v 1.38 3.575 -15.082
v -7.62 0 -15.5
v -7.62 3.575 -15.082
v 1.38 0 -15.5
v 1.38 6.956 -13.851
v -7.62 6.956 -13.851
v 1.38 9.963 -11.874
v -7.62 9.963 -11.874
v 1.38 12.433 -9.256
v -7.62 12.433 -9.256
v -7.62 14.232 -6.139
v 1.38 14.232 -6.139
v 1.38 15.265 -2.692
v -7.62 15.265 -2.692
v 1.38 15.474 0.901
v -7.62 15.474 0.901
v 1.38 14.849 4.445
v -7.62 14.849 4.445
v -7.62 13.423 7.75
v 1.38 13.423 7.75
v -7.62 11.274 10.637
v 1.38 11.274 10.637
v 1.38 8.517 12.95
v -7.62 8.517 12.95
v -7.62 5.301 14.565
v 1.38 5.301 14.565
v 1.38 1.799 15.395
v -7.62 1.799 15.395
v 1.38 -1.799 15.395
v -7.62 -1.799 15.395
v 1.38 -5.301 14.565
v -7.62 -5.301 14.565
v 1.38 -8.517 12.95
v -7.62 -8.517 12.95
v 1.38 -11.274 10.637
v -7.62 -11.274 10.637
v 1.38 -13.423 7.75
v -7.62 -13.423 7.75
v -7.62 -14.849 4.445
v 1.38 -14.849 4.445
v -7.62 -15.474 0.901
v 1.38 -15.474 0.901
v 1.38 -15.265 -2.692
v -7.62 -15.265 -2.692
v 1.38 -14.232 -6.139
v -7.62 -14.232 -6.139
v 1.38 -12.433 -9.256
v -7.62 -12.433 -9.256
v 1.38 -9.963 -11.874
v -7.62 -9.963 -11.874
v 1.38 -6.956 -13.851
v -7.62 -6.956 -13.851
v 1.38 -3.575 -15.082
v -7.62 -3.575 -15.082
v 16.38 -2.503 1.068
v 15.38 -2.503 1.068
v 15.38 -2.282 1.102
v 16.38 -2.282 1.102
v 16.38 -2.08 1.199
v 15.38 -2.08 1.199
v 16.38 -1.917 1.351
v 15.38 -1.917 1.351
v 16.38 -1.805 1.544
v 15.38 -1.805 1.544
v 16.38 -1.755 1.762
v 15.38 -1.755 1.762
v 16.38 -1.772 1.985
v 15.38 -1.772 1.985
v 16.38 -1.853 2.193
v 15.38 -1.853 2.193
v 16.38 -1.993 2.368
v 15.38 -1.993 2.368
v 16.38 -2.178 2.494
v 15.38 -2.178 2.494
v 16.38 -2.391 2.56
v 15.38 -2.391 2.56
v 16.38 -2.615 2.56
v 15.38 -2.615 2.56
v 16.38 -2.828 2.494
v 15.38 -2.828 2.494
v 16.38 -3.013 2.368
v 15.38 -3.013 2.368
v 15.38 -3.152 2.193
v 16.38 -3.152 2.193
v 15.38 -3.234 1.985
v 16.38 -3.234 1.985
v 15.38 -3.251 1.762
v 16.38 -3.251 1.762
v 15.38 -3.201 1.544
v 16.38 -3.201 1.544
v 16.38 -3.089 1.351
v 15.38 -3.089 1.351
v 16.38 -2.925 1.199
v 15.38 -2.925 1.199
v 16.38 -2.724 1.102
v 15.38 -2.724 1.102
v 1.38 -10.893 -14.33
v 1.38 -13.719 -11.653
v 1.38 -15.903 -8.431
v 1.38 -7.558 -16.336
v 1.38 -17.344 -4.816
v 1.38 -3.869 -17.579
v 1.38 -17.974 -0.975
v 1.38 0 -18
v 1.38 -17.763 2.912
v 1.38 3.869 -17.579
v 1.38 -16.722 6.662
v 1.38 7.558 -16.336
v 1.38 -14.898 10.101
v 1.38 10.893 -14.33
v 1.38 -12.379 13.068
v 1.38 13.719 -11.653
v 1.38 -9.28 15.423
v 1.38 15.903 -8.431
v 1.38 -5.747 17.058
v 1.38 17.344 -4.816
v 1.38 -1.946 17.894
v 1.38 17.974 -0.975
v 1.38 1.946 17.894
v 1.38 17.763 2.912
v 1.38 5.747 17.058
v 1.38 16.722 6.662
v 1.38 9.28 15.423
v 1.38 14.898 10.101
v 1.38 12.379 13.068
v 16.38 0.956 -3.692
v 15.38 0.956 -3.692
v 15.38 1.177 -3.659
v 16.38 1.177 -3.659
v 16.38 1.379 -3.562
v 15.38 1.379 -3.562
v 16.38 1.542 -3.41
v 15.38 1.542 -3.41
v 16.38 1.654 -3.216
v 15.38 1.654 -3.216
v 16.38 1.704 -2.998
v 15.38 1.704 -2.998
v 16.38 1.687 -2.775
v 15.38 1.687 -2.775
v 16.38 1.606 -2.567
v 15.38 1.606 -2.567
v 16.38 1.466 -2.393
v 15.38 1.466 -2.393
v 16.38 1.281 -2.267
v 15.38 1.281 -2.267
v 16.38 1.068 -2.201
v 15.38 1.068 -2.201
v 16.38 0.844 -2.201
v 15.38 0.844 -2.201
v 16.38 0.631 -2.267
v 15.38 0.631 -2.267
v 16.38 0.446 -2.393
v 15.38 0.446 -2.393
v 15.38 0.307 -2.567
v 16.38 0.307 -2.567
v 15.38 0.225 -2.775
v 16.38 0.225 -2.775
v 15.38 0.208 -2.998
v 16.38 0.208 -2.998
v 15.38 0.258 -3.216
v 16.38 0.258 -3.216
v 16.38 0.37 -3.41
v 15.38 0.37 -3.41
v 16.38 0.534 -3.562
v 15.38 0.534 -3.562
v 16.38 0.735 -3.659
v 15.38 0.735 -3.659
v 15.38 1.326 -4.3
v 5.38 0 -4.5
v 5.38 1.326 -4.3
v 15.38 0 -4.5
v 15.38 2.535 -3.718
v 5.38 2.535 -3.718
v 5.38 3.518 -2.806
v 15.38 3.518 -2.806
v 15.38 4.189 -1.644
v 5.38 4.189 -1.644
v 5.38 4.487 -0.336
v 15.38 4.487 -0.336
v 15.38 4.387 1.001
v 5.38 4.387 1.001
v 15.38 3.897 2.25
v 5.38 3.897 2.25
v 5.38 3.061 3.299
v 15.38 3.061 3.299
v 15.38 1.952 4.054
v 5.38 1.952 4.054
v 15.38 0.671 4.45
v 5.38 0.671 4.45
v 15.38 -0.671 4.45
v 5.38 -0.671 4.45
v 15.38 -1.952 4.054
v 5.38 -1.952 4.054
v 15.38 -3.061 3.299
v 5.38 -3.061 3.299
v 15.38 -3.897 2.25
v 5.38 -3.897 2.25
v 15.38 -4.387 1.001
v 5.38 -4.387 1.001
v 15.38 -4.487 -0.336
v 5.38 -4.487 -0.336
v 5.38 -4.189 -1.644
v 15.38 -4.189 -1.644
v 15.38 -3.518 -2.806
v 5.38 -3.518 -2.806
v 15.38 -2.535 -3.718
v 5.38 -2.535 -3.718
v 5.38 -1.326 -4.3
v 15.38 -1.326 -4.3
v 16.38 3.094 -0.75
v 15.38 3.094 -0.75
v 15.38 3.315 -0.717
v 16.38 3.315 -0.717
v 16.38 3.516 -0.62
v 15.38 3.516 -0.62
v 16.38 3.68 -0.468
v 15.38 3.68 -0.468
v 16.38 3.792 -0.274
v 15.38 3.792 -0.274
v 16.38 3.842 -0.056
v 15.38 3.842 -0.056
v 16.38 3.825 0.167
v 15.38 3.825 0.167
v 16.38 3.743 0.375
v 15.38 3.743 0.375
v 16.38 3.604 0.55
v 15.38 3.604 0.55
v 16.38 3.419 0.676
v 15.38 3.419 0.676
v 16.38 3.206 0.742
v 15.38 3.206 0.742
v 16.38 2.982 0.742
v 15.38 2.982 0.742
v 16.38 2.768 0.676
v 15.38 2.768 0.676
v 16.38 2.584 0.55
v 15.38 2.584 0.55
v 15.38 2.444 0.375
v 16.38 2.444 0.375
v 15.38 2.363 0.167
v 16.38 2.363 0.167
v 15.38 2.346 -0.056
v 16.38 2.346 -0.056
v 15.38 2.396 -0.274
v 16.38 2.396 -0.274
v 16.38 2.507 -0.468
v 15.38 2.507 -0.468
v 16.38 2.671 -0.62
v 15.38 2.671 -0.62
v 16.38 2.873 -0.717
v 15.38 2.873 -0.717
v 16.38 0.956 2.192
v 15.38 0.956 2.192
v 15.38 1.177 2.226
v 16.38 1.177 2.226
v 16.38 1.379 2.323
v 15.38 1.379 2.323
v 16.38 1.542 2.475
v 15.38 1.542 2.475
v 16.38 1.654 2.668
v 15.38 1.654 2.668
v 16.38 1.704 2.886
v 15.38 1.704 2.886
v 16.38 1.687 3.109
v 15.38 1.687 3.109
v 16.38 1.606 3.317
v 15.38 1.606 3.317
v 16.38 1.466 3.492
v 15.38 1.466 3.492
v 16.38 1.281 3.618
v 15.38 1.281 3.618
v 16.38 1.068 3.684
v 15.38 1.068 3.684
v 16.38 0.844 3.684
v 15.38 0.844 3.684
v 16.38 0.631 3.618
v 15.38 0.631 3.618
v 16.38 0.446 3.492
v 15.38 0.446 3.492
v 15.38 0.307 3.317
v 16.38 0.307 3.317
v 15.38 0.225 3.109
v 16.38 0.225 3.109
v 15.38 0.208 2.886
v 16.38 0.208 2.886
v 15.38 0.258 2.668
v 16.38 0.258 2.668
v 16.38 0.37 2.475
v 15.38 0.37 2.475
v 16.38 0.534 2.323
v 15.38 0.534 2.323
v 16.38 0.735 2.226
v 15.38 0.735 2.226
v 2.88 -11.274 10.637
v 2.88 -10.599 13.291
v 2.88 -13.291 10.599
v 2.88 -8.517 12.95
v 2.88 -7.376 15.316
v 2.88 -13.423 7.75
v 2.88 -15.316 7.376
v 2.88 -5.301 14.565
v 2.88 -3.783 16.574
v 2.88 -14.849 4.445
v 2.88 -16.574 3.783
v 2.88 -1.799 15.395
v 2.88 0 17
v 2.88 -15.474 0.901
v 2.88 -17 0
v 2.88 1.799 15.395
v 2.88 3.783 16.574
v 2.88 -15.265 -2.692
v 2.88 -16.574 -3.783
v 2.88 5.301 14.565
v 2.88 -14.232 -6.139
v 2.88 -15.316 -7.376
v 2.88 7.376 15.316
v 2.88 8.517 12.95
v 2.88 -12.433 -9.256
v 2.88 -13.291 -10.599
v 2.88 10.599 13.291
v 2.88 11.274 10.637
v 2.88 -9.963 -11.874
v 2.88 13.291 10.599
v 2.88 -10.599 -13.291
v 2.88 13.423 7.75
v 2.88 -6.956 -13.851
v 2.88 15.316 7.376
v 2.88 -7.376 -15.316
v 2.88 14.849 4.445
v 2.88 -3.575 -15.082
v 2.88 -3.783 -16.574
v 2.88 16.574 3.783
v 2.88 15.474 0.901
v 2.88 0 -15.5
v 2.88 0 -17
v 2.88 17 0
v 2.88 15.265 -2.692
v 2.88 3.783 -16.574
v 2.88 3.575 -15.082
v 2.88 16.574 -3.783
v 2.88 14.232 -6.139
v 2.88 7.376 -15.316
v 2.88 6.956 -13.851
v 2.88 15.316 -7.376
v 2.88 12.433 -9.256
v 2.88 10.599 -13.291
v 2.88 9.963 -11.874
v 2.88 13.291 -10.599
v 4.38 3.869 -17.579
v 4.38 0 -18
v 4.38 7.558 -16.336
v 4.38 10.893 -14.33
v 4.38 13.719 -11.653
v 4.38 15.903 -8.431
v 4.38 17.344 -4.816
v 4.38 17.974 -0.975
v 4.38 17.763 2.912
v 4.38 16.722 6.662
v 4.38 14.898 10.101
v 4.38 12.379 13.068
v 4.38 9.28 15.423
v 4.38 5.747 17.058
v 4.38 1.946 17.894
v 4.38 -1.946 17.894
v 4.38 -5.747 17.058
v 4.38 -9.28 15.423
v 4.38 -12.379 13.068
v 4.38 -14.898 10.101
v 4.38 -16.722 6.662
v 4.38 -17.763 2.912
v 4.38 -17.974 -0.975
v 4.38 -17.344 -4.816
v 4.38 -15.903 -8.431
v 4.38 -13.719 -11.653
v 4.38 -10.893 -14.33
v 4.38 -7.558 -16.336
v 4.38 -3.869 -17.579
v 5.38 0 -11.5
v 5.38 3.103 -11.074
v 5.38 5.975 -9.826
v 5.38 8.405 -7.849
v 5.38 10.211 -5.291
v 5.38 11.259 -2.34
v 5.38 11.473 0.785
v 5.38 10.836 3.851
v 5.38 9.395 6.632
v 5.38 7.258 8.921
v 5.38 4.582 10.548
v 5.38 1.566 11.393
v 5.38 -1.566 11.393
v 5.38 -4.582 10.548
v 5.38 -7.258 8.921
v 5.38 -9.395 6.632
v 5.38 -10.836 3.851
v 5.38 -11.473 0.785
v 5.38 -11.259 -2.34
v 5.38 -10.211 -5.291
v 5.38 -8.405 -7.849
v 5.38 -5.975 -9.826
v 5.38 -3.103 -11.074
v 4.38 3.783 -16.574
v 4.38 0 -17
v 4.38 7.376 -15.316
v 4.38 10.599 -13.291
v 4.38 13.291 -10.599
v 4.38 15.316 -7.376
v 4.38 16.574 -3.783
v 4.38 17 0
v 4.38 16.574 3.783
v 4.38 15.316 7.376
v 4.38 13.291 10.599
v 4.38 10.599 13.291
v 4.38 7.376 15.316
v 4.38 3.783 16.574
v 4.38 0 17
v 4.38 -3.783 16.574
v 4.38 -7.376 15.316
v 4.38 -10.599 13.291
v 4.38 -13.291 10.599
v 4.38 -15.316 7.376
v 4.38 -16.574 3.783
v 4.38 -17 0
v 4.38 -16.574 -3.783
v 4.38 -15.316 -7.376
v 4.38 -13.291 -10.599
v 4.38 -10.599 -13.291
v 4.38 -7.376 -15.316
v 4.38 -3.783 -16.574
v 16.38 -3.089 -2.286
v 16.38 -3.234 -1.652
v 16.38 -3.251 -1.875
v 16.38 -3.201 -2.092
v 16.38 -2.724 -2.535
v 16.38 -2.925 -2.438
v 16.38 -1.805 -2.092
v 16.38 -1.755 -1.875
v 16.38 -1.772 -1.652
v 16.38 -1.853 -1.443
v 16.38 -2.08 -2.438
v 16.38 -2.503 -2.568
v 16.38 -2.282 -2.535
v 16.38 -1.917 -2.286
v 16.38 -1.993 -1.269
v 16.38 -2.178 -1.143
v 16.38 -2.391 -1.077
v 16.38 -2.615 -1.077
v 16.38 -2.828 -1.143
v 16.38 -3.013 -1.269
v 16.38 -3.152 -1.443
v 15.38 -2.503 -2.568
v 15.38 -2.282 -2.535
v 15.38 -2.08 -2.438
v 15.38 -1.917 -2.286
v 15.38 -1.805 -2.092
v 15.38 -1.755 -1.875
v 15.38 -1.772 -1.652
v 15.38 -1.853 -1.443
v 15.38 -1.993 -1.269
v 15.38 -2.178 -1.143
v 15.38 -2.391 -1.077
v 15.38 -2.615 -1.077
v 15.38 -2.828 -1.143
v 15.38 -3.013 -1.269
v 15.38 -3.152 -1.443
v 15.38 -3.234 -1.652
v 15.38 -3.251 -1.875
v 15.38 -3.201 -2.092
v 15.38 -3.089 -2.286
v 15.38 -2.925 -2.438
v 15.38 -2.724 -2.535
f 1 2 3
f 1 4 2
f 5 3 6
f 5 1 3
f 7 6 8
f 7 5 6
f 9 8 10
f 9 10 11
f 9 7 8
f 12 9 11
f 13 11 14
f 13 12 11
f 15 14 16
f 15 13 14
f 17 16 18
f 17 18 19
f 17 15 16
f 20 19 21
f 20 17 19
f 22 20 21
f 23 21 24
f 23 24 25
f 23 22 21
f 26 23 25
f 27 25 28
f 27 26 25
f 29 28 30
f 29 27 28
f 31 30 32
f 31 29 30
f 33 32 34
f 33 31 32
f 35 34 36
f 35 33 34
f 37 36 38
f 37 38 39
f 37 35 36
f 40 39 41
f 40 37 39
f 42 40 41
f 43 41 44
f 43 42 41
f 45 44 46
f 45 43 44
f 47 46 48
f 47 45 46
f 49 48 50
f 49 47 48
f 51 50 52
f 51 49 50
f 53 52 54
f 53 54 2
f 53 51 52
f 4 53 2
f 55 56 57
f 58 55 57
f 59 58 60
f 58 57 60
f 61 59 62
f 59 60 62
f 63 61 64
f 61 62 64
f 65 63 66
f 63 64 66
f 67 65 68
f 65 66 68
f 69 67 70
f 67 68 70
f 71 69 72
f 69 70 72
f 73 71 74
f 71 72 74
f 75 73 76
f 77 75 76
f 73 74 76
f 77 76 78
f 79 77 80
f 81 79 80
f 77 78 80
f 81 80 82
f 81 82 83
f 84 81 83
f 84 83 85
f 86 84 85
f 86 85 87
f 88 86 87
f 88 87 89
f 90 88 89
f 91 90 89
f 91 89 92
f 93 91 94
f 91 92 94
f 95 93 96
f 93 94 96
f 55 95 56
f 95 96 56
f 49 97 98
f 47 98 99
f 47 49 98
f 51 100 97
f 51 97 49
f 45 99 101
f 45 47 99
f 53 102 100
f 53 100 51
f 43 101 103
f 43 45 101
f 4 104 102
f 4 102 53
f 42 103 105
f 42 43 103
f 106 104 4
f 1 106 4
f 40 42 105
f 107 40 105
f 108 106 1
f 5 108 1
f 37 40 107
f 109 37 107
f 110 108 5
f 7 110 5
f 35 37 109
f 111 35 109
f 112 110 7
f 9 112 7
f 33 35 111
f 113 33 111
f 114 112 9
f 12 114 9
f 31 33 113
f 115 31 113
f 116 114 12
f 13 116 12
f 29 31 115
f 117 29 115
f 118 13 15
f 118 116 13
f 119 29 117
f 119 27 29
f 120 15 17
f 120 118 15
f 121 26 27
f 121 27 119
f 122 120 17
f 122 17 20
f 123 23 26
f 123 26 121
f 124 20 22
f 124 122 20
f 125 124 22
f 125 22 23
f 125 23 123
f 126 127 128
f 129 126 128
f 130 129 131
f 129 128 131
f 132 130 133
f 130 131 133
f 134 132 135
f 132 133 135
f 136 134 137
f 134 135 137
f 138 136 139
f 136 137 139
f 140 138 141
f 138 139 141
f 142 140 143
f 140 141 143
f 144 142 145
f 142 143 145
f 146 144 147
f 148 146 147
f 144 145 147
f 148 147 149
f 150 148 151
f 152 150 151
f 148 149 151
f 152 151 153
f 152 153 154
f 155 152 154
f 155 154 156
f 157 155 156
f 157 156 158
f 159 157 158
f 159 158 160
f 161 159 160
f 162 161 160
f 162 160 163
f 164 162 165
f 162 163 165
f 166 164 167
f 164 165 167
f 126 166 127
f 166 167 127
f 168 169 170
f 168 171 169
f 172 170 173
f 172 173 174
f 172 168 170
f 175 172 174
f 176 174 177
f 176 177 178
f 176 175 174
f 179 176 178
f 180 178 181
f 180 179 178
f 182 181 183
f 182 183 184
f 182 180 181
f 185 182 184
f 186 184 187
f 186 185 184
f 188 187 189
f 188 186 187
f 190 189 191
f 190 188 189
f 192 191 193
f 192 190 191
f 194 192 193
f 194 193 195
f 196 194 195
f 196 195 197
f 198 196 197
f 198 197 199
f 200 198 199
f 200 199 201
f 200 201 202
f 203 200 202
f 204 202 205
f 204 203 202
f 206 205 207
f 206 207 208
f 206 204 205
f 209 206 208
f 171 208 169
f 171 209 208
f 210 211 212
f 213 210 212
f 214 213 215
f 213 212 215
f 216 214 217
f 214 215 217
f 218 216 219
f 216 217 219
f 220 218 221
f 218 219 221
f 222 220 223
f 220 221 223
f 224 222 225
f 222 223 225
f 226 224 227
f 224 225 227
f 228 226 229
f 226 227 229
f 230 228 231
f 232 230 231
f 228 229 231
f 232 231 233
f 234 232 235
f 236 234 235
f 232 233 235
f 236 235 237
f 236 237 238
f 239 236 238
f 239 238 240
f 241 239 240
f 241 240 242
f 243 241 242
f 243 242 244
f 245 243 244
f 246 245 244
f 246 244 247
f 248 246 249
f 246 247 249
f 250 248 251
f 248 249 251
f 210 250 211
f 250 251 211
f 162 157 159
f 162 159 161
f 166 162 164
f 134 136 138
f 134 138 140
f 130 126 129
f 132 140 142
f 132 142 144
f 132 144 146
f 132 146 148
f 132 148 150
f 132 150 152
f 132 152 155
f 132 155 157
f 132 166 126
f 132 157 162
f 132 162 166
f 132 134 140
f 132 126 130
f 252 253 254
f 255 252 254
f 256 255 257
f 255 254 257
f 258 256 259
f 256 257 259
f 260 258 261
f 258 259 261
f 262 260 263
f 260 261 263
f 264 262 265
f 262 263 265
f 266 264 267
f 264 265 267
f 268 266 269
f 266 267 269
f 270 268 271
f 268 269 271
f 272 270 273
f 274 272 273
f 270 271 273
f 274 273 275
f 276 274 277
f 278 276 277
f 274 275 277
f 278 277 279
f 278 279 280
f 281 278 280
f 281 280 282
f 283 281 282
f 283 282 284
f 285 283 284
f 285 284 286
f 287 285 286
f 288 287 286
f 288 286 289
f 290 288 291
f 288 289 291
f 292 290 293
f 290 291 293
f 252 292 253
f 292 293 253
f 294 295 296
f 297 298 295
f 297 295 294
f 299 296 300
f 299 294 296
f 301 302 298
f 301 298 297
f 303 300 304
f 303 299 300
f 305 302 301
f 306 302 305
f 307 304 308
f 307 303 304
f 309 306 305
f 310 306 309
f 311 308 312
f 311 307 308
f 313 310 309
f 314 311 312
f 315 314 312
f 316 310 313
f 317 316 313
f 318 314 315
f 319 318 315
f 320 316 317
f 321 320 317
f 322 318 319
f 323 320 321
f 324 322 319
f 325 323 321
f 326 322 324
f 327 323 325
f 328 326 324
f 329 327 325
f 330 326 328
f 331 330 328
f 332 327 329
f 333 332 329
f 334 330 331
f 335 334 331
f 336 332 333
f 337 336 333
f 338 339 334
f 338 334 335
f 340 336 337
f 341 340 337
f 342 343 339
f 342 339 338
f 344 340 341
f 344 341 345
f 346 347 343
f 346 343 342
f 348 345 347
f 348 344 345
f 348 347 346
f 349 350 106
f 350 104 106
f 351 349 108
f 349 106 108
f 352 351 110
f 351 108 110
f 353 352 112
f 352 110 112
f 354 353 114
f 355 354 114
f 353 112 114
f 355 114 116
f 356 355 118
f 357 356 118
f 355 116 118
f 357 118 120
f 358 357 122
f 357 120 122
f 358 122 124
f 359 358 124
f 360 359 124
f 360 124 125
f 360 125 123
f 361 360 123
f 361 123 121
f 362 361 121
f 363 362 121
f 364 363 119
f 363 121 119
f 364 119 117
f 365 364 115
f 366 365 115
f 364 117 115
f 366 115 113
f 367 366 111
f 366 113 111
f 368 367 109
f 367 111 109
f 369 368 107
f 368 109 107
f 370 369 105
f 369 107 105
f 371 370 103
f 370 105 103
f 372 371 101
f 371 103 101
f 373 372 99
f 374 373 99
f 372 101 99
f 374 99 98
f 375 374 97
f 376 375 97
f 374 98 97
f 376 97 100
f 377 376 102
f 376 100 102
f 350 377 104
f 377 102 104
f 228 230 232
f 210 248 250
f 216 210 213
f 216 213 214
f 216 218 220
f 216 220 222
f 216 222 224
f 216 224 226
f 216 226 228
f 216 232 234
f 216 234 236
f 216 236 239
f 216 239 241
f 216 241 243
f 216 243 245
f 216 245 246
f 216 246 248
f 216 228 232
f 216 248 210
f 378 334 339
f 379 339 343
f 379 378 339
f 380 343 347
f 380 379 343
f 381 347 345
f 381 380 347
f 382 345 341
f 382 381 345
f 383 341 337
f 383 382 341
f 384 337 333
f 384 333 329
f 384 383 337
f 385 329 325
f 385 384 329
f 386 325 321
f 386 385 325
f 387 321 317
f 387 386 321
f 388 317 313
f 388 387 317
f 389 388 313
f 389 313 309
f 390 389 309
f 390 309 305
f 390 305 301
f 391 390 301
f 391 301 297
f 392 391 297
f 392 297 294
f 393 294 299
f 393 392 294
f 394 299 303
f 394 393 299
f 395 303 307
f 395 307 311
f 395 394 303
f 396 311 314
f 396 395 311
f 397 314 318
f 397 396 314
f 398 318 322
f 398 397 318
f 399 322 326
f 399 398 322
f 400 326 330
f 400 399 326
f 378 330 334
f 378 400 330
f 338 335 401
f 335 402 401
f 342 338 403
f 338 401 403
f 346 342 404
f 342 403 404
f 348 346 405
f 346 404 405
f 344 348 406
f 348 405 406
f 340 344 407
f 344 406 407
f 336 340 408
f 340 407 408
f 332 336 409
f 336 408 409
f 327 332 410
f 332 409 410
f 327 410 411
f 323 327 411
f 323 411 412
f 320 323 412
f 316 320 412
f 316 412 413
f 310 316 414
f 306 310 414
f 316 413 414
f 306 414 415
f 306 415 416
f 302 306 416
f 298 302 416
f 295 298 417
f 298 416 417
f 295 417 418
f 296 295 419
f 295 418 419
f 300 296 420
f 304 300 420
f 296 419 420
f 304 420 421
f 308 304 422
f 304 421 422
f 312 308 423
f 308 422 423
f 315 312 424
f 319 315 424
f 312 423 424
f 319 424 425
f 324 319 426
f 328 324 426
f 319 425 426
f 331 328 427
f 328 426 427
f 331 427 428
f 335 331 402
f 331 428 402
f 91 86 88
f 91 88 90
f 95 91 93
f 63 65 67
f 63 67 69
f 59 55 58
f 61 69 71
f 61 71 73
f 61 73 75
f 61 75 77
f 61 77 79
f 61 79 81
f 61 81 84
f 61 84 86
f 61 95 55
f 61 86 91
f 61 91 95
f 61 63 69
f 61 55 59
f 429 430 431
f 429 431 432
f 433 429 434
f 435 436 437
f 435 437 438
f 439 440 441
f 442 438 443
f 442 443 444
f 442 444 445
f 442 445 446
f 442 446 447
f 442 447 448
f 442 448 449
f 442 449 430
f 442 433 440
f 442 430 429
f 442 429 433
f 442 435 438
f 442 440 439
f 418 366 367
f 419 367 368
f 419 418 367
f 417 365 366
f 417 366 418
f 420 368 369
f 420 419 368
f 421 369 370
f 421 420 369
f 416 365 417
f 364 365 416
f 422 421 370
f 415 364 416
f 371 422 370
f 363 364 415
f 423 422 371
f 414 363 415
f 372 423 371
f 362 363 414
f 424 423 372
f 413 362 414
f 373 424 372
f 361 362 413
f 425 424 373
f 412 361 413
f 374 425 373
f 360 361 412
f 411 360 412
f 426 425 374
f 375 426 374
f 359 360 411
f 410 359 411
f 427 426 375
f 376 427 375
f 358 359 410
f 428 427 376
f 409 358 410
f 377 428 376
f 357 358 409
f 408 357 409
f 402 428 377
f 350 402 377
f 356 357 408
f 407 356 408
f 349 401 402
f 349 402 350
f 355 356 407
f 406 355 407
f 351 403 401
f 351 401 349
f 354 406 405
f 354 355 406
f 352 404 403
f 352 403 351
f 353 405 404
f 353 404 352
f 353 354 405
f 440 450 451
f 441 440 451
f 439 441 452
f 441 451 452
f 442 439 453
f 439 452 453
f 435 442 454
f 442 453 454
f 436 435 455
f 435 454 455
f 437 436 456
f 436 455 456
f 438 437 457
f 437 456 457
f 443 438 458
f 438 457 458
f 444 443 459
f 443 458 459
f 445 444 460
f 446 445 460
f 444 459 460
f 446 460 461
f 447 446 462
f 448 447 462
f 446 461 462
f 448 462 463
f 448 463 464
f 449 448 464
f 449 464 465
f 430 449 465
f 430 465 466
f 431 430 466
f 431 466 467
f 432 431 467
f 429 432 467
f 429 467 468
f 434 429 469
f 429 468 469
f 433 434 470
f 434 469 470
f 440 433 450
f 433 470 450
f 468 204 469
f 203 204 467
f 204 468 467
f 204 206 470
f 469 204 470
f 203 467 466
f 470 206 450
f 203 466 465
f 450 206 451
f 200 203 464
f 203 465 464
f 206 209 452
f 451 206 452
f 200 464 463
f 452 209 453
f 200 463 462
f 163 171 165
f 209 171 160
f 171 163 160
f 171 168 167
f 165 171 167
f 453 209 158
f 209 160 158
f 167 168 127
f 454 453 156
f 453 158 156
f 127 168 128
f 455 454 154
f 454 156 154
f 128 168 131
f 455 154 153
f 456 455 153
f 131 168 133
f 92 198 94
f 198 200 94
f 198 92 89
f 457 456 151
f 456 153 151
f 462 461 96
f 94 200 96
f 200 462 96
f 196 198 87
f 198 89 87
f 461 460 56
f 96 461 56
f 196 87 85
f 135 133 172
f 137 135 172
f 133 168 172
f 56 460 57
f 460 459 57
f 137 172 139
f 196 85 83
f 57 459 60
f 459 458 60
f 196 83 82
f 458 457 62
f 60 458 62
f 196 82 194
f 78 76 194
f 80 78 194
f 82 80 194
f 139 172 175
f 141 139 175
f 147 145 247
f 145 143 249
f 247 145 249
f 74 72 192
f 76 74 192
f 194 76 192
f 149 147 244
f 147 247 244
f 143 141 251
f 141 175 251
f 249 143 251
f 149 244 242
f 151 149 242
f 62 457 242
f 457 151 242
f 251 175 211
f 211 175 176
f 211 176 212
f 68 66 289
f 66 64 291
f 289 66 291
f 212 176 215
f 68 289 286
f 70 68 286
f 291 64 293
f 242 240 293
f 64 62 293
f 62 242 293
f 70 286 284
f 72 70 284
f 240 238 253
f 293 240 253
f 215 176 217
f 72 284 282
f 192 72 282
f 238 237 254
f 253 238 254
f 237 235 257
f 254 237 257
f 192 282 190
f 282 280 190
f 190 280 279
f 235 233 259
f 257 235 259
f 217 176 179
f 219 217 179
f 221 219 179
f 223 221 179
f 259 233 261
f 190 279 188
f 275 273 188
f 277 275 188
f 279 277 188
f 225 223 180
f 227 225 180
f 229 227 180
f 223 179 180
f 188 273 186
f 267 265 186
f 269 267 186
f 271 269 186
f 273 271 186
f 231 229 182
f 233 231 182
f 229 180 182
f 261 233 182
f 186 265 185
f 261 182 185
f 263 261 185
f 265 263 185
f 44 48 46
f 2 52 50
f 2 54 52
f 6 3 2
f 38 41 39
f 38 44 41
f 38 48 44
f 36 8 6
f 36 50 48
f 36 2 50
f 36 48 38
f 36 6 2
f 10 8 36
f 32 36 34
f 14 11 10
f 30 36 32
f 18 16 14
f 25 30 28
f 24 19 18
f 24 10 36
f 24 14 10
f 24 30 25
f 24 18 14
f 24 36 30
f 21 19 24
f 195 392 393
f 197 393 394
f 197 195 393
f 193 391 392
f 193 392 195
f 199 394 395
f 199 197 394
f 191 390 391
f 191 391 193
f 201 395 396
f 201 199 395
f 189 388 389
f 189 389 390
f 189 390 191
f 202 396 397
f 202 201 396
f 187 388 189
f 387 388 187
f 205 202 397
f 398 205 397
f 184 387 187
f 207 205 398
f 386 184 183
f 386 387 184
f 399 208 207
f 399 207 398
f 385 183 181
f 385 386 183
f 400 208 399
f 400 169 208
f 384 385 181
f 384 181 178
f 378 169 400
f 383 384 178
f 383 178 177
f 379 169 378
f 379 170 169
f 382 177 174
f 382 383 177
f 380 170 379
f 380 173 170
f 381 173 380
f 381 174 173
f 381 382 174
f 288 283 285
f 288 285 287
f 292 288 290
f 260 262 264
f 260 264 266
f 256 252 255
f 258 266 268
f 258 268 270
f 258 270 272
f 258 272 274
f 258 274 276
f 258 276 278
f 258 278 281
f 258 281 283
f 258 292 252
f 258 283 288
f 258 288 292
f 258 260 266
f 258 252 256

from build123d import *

# Parameters (mm, degrees)
SKETCH4_R           = 0.75
BOSS_EXTRUDE2_DEPTH = 1


with BuildPart() as part:
    # Sketch1 → Revolve1 (revolve)
    with BuildSketch(Plane(origin=(0, 0, 0), x_dir=(1, 0, 0), z_dir=(0, 1, 0))):
        Polygon((-7.620406457, 0), (-7.620406457, 15.5), (1.379593543, 15.5), (1.379593543, 18), (3.379593543, 18), (4.379593543, 18), (4.379593543, 17), (3.379593543, 17), (2.879593543, 17), (2.879593543, 15.5), (5.379593543, 11.5), (5.379593543, 4.5), (15.379593543, 4.5), (15.379593543, 3.7), (15.379593543, 0), (14.579593543, 0), (5.379593543, 0), align=None)
    revolve(axis=Axis((-25, 0, 0), (1, 0, 0)))

    # Sketch4 → Boss-Extrude2 (add)
    with BuildSketch(Plane(origin=(15.379593543, 0, 0), x_dir=(0, 0, -1), z_dir=(1, 0, 0))):
        with Locations((0, 3.093773222)):
            Circle(SKETCH4_R)
        with Locations((2.942353182, 0.956028502)):
            Circle(SKETCH4_R)
        with Locations((1.818474274, -2.502915113)):
            Circle(SKETCH4_R)
        with Locations((-1.818474274, -2.502915113)):
            Circle(SKETCH4_R)
        with Locations((-2.942353182, 0.956028502)):
            Circle(SKETCH4_R)
    extrude(amount=BOSS_EXTRUDE2_DEPTH)


solid = part.part
